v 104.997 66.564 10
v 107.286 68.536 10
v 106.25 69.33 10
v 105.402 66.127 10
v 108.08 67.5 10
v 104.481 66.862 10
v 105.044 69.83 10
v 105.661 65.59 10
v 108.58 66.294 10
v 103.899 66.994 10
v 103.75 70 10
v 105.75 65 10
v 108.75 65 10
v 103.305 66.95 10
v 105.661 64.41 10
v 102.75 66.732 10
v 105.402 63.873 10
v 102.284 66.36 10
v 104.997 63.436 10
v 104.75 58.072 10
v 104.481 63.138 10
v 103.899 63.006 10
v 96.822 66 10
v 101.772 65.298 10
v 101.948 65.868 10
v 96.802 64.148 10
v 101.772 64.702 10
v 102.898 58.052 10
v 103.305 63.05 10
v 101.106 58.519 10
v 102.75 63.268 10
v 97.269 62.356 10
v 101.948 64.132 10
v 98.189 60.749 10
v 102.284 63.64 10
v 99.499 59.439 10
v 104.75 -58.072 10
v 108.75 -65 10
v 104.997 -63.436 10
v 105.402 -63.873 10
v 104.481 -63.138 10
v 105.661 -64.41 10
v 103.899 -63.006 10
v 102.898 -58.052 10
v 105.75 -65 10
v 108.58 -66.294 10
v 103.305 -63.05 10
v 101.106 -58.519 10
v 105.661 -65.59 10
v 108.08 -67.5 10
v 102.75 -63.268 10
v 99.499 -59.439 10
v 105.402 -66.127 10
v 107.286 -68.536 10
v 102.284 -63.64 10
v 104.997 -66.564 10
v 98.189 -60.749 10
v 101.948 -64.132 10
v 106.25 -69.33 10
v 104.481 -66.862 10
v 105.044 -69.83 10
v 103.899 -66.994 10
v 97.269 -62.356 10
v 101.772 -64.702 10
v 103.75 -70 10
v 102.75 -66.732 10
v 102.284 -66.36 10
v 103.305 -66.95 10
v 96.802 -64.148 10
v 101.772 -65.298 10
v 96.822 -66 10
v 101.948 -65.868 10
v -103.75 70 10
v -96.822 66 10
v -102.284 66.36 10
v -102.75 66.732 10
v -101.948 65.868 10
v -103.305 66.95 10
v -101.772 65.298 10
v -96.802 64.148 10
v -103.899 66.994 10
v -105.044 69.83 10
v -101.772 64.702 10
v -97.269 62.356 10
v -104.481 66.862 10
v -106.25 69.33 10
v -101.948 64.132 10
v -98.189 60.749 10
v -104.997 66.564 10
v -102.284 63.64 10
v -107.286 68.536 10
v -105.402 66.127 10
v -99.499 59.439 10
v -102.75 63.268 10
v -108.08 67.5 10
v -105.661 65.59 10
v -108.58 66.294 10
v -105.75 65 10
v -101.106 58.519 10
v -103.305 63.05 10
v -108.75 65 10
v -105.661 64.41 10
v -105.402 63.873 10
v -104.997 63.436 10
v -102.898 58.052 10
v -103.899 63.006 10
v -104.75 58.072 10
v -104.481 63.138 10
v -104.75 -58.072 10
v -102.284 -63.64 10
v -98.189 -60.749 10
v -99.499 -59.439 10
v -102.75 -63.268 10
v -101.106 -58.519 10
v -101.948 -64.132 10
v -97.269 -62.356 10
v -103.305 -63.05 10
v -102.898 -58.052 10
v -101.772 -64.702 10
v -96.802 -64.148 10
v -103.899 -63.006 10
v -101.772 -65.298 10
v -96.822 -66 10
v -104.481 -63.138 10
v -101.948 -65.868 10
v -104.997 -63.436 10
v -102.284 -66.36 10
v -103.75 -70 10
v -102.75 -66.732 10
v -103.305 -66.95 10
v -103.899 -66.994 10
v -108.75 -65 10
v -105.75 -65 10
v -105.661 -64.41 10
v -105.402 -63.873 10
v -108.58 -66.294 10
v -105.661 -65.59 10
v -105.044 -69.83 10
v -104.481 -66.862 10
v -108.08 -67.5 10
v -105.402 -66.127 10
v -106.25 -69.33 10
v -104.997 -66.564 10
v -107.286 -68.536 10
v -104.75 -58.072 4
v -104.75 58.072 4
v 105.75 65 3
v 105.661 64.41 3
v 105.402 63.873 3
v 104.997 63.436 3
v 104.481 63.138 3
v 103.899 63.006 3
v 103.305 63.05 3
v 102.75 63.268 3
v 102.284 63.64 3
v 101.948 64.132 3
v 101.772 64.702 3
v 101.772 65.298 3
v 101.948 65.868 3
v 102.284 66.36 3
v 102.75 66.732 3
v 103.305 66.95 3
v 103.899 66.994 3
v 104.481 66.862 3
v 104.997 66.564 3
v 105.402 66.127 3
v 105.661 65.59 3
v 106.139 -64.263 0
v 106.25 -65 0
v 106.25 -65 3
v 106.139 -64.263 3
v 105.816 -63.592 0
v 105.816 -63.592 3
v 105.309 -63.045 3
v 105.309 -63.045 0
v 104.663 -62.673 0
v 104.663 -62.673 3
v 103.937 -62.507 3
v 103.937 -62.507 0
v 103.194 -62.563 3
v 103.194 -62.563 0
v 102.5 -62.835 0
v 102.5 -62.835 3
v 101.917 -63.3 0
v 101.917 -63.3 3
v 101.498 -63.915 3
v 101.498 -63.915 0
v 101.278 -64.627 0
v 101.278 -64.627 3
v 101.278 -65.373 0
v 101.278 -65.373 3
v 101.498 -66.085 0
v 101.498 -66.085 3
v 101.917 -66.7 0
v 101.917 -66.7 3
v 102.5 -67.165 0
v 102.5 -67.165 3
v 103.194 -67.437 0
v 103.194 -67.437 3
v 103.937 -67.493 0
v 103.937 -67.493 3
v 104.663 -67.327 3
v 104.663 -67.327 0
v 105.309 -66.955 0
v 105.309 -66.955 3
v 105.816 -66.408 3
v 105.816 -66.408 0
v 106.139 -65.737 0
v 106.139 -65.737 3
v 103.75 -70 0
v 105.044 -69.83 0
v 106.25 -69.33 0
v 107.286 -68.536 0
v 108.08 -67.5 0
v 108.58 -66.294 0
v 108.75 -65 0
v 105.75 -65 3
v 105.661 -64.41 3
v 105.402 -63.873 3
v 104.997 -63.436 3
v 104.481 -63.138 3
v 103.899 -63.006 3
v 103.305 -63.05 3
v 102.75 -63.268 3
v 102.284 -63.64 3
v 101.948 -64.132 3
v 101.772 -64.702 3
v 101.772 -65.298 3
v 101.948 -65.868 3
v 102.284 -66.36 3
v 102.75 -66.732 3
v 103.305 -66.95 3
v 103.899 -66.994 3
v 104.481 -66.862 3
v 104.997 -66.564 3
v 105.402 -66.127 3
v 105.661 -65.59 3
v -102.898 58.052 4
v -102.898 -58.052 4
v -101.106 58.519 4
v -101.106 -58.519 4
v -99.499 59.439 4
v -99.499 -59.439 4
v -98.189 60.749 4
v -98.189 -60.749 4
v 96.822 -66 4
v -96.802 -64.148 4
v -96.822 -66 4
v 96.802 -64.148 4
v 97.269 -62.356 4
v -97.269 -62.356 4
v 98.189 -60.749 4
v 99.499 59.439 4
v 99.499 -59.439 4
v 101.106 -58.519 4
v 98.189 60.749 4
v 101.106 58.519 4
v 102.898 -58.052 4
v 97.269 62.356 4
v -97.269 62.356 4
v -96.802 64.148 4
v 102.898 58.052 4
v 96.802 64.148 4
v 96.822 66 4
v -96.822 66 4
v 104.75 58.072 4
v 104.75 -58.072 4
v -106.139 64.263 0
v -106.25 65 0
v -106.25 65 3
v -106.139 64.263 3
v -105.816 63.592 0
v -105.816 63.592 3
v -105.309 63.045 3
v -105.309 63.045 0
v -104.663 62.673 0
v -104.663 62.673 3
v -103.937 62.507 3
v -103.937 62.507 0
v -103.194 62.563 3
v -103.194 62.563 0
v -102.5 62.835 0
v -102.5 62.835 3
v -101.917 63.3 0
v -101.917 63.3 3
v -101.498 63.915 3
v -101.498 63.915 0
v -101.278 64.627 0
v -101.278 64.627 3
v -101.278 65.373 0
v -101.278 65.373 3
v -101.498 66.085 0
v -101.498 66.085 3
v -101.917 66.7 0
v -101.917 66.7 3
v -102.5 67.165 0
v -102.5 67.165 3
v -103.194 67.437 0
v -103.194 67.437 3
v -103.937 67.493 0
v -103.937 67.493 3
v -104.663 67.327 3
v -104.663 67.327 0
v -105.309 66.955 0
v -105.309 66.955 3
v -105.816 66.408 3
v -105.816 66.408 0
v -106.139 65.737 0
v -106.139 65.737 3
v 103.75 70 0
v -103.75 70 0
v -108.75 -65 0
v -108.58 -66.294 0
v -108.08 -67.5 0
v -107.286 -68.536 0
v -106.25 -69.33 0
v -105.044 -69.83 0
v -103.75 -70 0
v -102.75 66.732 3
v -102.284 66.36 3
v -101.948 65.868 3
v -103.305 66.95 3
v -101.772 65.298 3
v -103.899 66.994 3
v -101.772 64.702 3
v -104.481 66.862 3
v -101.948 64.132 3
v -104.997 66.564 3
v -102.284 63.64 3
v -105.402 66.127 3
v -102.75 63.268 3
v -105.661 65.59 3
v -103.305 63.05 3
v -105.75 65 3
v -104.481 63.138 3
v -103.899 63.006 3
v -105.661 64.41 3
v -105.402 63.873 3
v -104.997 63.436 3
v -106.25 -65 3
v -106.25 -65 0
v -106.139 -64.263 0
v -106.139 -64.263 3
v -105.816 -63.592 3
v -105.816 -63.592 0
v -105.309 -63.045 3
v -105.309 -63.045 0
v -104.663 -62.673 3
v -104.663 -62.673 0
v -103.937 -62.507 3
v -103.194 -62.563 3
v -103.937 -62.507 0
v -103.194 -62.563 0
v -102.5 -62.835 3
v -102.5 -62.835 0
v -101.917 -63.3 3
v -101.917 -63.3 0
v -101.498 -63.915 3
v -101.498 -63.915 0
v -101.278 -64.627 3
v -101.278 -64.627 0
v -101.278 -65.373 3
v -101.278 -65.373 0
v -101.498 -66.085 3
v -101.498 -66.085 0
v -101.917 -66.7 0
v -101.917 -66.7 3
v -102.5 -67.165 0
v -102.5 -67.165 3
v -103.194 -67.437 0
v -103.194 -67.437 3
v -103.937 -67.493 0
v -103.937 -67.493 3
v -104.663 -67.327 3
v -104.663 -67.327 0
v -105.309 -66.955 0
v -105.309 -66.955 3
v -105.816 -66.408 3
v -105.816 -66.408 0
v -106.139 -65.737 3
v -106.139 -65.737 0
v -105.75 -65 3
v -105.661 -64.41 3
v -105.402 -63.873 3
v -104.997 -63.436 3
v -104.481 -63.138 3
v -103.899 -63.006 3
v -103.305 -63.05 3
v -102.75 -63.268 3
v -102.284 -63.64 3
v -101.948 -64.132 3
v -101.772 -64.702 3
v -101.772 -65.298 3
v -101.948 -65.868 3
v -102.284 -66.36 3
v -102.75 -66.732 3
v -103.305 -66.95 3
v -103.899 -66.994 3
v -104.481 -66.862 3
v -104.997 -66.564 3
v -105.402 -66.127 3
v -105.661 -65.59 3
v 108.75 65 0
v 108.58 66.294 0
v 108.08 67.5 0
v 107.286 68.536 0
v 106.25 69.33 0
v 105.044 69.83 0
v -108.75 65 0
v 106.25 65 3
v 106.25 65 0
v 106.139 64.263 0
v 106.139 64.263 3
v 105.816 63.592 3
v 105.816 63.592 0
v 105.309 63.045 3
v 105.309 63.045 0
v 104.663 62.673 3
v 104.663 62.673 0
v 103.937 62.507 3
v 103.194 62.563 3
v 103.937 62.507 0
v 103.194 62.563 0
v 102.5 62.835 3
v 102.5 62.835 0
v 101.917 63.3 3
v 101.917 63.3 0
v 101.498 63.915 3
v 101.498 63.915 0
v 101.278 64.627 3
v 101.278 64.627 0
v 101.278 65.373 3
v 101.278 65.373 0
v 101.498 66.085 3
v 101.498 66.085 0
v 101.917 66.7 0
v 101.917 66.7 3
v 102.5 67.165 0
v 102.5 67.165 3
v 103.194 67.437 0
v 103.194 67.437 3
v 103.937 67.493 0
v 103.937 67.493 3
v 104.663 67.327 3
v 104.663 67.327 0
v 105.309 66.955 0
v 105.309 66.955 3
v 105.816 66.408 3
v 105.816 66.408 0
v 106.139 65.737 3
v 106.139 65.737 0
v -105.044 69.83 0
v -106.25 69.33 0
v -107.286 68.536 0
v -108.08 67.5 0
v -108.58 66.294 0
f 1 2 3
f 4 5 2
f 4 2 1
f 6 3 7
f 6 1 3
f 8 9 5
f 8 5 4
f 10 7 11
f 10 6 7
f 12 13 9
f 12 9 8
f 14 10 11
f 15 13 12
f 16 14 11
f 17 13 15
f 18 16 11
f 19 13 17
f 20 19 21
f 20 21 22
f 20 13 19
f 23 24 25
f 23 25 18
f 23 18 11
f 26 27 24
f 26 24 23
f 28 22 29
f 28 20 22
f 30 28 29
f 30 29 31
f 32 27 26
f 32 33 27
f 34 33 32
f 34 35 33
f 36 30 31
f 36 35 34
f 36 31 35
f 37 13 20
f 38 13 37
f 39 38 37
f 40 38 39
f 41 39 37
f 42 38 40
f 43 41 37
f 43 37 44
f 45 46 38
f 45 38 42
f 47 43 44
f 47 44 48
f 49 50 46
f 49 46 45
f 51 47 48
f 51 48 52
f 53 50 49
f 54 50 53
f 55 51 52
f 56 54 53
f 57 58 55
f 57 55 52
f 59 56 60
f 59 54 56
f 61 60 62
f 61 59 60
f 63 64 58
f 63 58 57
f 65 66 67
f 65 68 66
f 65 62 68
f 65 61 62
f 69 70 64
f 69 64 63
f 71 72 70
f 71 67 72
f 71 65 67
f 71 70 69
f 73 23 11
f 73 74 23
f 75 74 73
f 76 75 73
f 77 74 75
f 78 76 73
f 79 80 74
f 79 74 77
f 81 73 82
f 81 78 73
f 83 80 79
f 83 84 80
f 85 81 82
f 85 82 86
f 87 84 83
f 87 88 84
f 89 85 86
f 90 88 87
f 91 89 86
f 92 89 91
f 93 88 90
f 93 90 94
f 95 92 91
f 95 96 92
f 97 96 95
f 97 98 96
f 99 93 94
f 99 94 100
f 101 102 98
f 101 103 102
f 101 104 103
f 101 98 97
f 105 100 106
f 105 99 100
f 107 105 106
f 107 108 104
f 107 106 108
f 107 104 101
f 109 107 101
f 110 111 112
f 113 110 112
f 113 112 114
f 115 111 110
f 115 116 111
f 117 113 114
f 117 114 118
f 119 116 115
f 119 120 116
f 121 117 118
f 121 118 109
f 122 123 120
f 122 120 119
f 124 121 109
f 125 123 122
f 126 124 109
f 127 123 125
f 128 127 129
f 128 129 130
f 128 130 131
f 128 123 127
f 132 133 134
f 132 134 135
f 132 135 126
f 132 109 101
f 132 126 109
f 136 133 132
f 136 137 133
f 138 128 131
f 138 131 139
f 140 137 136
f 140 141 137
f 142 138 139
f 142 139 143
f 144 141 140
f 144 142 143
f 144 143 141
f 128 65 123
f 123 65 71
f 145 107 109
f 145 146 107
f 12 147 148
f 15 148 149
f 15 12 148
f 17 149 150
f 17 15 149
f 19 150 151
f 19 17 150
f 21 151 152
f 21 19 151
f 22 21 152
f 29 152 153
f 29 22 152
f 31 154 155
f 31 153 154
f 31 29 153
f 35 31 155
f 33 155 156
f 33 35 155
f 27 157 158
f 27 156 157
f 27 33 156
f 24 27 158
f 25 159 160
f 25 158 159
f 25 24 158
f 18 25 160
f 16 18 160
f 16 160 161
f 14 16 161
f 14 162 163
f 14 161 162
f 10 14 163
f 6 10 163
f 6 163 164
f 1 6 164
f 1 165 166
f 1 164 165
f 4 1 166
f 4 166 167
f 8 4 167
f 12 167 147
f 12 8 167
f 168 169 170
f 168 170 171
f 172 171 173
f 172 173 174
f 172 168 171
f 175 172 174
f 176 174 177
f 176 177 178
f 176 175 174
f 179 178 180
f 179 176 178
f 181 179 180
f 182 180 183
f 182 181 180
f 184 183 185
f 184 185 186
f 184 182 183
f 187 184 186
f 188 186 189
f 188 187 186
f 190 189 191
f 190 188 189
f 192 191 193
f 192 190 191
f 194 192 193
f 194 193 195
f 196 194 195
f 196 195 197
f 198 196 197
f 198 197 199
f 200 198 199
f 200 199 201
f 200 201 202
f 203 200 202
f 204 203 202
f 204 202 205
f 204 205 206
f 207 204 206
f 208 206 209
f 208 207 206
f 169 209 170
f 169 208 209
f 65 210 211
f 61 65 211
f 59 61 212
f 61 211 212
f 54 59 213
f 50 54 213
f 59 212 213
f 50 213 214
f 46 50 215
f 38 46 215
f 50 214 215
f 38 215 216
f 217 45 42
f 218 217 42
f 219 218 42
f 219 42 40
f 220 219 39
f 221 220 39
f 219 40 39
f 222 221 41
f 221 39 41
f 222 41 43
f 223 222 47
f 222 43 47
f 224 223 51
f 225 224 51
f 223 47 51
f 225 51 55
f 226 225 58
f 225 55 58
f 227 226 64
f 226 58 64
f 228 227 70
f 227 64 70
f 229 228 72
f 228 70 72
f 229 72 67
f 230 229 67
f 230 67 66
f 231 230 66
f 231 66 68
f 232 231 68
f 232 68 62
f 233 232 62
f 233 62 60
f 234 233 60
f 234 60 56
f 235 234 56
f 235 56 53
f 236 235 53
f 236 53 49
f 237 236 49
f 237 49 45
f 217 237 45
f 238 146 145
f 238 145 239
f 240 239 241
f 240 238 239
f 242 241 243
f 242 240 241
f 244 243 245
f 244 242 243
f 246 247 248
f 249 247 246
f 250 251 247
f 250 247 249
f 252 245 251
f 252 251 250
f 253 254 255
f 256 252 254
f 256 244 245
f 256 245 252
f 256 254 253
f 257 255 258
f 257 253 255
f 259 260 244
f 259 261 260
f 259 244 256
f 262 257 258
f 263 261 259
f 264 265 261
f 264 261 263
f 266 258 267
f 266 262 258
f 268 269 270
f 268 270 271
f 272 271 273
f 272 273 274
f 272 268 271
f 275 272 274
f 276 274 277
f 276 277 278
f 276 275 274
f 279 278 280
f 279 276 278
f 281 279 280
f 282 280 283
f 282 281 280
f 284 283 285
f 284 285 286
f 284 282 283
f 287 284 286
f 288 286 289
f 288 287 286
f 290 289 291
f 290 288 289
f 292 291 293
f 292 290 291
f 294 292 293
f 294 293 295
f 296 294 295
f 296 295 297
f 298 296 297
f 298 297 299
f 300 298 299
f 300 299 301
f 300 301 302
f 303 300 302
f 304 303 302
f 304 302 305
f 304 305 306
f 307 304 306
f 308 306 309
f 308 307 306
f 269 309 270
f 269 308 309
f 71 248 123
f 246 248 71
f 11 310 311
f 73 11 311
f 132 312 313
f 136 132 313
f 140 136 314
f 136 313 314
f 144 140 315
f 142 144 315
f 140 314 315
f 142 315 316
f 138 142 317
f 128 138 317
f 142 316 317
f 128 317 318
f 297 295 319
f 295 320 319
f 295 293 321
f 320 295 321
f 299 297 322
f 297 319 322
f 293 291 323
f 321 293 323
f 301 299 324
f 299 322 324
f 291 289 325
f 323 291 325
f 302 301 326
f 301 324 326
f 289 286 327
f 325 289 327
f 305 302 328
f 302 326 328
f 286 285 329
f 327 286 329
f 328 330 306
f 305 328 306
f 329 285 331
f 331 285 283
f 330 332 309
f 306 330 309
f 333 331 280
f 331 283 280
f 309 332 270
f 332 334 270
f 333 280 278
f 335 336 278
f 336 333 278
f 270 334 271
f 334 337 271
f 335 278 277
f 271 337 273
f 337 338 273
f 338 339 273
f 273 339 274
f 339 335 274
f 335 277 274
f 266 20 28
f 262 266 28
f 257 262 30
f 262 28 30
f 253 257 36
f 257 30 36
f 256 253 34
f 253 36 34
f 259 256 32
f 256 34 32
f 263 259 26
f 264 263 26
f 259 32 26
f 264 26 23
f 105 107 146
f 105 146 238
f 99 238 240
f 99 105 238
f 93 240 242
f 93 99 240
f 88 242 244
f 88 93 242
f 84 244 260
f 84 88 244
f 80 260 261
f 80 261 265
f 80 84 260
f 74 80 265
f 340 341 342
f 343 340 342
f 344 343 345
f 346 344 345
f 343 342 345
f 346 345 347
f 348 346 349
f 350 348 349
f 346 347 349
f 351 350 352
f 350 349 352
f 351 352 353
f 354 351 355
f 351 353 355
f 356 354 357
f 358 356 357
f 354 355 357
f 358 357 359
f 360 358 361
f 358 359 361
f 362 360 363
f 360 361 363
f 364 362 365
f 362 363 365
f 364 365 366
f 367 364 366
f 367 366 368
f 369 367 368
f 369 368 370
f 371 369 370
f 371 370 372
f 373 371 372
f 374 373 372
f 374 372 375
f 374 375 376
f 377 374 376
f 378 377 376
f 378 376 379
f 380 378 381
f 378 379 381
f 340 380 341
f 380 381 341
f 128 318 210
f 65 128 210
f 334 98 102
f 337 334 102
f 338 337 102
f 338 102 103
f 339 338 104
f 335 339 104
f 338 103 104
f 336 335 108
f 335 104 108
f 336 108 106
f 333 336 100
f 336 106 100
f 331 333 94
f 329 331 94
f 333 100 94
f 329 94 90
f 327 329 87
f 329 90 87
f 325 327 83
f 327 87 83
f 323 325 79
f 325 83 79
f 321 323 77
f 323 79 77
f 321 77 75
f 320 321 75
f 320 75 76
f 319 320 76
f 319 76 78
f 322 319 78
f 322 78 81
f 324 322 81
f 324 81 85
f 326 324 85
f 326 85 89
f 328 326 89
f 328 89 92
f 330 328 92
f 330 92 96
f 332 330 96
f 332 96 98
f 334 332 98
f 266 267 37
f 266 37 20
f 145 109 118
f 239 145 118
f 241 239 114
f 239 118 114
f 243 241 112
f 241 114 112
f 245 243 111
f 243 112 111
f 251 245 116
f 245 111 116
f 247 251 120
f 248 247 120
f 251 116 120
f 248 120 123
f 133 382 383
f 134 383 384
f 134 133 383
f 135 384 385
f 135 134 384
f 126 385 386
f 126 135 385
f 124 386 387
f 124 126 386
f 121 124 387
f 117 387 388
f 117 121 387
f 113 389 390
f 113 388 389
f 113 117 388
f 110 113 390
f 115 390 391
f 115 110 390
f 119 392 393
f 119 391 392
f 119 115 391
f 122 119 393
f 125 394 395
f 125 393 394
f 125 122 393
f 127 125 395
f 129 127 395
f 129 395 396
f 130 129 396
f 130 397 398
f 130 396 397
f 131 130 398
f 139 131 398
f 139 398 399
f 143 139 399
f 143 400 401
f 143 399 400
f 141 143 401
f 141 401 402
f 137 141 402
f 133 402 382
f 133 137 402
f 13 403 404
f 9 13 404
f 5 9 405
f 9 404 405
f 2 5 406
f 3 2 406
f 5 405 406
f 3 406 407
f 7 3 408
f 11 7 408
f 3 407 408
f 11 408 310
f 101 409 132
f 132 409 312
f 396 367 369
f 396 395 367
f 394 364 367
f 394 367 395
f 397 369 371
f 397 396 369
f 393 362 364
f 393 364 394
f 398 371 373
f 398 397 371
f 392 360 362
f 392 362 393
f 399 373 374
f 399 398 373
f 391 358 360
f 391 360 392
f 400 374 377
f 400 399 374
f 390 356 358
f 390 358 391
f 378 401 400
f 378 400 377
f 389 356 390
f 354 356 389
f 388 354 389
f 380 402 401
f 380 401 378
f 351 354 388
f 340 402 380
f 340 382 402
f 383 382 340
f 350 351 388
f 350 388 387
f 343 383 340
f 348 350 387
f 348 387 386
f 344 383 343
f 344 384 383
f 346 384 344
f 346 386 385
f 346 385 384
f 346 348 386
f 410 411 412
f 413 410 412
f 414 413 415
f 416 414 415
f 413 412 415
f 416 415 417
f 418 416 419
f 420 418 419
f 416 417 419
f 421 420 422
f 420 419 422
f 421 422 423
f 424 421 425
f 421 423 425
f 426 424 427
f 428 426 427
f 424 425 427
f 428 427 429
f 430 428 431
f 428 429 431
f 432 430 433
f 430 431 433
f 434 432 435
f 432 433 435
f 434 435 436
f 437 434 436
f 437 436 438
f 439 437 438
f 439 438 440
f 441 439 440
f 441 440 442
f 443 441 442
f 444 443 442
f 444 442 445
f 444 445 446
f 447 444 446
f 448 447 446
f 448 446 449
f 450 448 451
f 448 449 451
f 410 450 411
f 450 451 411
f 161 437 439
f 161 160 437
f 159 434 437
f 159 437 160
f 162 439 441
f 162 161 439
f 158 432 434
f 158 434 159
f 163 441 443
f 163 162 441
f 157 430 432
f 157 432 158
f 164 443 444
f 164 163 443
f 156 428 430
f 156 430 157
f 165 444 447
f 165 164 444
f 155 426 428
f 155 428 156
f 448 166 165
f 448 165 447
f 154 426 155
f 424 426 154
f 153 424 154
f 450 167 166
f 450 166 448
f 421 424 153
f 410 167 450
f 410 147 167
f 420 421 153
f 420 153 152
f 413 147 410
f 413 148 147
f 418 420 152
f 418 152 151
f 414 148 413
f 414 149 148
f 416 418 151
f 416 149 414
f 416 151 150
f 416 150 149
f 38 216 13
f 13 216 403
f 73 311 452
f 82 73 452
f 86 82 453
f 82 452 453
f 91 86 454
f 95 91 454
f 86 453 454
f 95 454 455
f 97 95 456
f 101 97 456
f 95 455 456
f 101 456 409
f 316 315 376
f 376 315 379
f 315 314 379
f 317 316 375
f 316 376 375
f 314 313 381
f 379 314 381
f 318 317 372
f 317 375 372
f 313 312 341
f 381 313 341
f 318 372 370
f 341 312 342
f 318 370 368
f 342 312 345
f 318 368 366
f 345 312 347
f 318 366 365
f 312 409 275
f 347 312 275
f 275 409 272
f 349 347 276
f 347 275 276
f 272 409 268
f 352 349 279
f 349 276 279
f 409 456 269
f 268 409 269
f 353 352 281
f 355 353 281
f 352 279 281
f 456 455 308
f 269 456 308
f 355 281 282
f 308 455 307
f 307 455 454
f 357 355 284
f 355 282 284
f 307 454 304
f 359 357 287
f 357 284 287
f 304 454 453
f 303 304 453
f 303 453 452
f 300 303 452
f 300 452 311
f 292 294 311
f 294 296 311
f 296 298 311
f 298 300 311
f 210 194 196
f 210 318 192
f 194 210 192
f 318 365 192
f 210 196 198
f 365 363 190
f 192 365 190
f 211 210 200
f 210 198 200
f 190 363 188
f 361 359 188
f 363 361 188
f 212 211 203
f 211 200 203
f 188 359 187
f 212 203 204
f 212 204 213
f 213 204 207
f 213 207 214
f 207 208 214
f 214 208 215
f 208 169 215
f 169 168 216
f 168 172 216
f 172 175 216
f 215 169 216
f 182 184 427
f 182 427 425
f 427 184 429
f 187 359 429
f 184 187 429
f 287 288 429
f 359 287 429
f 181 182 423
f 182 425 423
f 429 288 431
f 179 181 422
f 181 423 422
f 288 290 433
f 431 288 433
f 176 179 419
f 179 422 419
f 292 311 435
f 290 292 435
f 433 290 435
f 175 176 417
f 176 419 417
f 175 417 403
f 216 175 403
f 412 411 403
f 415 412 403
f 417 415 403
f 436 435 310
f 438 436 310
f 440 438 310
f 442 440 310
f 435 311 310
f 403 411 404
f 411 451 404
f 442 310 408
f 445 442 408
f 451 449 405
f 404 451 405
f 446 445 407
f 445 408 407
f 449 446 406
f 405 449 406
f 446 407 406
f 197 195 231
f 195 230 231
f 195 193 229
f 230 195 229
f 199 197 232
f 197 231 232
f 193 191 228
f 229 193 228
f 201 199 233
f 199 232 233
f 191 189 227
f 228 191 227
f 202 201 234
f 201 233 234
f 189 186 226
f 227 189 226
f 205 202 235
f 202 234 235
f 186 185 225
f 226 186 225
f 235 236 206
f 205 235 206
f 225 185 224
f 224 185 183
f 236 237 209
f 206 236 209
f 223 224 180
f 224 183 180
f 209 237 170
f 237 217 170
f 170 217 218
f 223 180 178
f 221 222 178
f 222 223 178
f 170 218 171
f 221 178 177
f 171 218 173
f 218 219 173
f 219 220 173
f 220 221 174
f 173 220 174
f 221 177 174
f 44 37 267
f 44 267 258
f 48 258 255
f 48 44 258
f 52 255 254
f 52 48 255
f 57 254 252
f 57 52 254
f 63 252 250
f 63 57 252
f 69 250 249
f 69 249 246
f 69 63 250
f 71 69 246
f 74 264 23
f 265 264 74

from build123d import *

# Parameters (mm, degrees)
PAD_DEPTH                     = 10
THICKNESS_T                   = -4
PAD001_DEPTH                  = 6
PAD001_MIRRORED_2_DEPTH       = 6
SKETCH003_R                   = 2
POCKET_DEPTH                  = 527.71231
SKETCH003_MIRRORED002_2_R     = 2
POCKET_MIRRORED002_2_DEPTH    = 527.71231
SKETCH004_R                   = 2.5
POCKET001_DEPTH               = 3
SKETCH004_MIRRORED004_2_R     = 2.5
POCKET001_MIRRORED004_2_DEPTH = 3


with BuildPart() as part:
    # Sketch → Pad (new body)
    with BuildSketch(Plane.XY):
        with BuildLine():
            Line((-103.75, -70), (103.75, -70))
            ThreePointArc((103.75, -70), (107.285534, -68.535534), (108.75, -65))
            Line((108.75, -65), (108.75, 65))
            ThreePointArc((108.75, 65), (107.285534, 68.535534), (103.75, 70))
            Line((103.75, 70), (-103.75, 70))
            ThreePointArc((-103.75, 70), (-107.285534, 68.535534), (-108.75, 65))
            Line((-108.75, 65), (-108.75, -65))
            ThreePointArc((-108.75, -65), (-107.285534, -68.535534), (-103.75, -70))
        make_face()
    extrude(amount=PAD_DEPTH)

    # Thickness
    thickness_openings = [part.faces().sort_by_distance(p)[0] for p in [
        (0, 0, 10),
    ]]
    offset(amount=THICKNESS_T, openings=thickness_openings)

    # Sketch002 (on Face10 of Thickness) → Pad001 (join)
    with BuildSketch(Plane.XY.offset(10)):
        with BuildLine():
            ThreePointArc((104.75, -58.071797), (98.800253, -60.050253), (96.821797, -66))
            Line((103.75, -66), (96.821797, -66))
            ThreePointArc((103.75, -66), (104.457107, -65.707107), (104.75, -65))
            Line((104.75, -65), (104.75, -58.071797))
        make_face()
    pad001 = extrude(amount=-PAD001_DEPTH)

    # Sketch002 Mirrored 2 → Pad001 Mirrored 2 (add)
    with BuildSketch(Plane(origin=(0, 0, 10), x_dir=(-1, 0, 0), z_dir=(0, 0, -1))):
        with BuildLine():
            ThreePointArc((104.75, -58.071797), (98.800253, -60.050253), (96.821797, -66))
            Line((103.75, -66), (96.821797, -66))
            ThreePointArc((103.75, -66), (104.457107, -65.707107), (104.75, -65))
            Line((104.75, -65), (104.75, -58.071797))
        make_face()
    pad001_mirrored_2 = extrude(amount=PAD001_MIRRORED_2_DEPTH)

    # Mirrored001: Pad001, Pad001 Mirrored 2 across XZ
    add(pad001.mirror(Plane.XZ))
    add(pad001_mirrored_2.mirror(Plane.XZ))

    # Sketch003 (on Face10 of MultiTransform) → Pocket (cut, through all)
    with BuildSketch(Plane.XY.offset(10)):
        with Locations((103.75, -65)):
            Circle(SKETCH003_R)
    pocket = extrude(amount=-POCKET_DEPTH, mode=Mode.SUBTRACT)

    # Sketch003 Mirrored002 2 → Pocket Mirrored002 2 (cut, through all)
    with BuildSketch(Plane(origin=(0, 0, 10), x_dir=(-1, 0, 0), z_dir=(0, 0, -1))):
        with Locations((103.75, -65)):
            Circle(SKETCH003_MIRRORED002_2_R)
    pocket_mirrored002_2 = extrude(amount=POCKET_MIRRORED002_2_DEPTH, mode=Mode.SUBTRACT)

    # Mirrored003: Pocket, Pocket Mirrored002 2 across XZ
    add(pocket.mirror(Plane.XZ), mode=Mode.SUBTRACT)
    add(pocket_mirrored002_2.mirror(Plane.XZ), mode=Mode.SUBTRACT)

    # Sketch004 (on Face4 of MultiTransform001) → Pocket001 (cut)
    with BuildSketch(Plane(origin=(0, 0, 0), x_dir=(1, 0, 0), z_dir=(0, 0, -1))):
        with Locations((103.75, -65)):
            Circle(SKETCH004_R)
    pocket001 = extrude(amount=-POCKET001_DEPTH, mode=Mode.SUBTRACT)

    # Sketch004 Mirrored004 2 → Pocket001 Mirrored004 2 (cut)
    with BuildSketch(Plane(origin=(0, 0, 0), x_dir=(-1, 0, 0), z_dir=(0, 0, 1))):
        with Locations((103.75, -65)):
            Circle(SKETCH004_MIRRORED004_2_R)
    pocket001_mirrored004_2 = extrude(amount=POCKET001_MIRRORED004_2_DEPTH, mode=Mode.SUBTRACT)

    # Mirrored005: Pocket001, Pocket001 Mirrored004 2 across XZ
    add(pocket001.mirror(Plane.XZ), mode=Mode.SUBTRACT)
    add(pocket001_mirrored004_2.mirror(Plane.XZ), mode=Mode.SUBTRACT)


solid = part.part
